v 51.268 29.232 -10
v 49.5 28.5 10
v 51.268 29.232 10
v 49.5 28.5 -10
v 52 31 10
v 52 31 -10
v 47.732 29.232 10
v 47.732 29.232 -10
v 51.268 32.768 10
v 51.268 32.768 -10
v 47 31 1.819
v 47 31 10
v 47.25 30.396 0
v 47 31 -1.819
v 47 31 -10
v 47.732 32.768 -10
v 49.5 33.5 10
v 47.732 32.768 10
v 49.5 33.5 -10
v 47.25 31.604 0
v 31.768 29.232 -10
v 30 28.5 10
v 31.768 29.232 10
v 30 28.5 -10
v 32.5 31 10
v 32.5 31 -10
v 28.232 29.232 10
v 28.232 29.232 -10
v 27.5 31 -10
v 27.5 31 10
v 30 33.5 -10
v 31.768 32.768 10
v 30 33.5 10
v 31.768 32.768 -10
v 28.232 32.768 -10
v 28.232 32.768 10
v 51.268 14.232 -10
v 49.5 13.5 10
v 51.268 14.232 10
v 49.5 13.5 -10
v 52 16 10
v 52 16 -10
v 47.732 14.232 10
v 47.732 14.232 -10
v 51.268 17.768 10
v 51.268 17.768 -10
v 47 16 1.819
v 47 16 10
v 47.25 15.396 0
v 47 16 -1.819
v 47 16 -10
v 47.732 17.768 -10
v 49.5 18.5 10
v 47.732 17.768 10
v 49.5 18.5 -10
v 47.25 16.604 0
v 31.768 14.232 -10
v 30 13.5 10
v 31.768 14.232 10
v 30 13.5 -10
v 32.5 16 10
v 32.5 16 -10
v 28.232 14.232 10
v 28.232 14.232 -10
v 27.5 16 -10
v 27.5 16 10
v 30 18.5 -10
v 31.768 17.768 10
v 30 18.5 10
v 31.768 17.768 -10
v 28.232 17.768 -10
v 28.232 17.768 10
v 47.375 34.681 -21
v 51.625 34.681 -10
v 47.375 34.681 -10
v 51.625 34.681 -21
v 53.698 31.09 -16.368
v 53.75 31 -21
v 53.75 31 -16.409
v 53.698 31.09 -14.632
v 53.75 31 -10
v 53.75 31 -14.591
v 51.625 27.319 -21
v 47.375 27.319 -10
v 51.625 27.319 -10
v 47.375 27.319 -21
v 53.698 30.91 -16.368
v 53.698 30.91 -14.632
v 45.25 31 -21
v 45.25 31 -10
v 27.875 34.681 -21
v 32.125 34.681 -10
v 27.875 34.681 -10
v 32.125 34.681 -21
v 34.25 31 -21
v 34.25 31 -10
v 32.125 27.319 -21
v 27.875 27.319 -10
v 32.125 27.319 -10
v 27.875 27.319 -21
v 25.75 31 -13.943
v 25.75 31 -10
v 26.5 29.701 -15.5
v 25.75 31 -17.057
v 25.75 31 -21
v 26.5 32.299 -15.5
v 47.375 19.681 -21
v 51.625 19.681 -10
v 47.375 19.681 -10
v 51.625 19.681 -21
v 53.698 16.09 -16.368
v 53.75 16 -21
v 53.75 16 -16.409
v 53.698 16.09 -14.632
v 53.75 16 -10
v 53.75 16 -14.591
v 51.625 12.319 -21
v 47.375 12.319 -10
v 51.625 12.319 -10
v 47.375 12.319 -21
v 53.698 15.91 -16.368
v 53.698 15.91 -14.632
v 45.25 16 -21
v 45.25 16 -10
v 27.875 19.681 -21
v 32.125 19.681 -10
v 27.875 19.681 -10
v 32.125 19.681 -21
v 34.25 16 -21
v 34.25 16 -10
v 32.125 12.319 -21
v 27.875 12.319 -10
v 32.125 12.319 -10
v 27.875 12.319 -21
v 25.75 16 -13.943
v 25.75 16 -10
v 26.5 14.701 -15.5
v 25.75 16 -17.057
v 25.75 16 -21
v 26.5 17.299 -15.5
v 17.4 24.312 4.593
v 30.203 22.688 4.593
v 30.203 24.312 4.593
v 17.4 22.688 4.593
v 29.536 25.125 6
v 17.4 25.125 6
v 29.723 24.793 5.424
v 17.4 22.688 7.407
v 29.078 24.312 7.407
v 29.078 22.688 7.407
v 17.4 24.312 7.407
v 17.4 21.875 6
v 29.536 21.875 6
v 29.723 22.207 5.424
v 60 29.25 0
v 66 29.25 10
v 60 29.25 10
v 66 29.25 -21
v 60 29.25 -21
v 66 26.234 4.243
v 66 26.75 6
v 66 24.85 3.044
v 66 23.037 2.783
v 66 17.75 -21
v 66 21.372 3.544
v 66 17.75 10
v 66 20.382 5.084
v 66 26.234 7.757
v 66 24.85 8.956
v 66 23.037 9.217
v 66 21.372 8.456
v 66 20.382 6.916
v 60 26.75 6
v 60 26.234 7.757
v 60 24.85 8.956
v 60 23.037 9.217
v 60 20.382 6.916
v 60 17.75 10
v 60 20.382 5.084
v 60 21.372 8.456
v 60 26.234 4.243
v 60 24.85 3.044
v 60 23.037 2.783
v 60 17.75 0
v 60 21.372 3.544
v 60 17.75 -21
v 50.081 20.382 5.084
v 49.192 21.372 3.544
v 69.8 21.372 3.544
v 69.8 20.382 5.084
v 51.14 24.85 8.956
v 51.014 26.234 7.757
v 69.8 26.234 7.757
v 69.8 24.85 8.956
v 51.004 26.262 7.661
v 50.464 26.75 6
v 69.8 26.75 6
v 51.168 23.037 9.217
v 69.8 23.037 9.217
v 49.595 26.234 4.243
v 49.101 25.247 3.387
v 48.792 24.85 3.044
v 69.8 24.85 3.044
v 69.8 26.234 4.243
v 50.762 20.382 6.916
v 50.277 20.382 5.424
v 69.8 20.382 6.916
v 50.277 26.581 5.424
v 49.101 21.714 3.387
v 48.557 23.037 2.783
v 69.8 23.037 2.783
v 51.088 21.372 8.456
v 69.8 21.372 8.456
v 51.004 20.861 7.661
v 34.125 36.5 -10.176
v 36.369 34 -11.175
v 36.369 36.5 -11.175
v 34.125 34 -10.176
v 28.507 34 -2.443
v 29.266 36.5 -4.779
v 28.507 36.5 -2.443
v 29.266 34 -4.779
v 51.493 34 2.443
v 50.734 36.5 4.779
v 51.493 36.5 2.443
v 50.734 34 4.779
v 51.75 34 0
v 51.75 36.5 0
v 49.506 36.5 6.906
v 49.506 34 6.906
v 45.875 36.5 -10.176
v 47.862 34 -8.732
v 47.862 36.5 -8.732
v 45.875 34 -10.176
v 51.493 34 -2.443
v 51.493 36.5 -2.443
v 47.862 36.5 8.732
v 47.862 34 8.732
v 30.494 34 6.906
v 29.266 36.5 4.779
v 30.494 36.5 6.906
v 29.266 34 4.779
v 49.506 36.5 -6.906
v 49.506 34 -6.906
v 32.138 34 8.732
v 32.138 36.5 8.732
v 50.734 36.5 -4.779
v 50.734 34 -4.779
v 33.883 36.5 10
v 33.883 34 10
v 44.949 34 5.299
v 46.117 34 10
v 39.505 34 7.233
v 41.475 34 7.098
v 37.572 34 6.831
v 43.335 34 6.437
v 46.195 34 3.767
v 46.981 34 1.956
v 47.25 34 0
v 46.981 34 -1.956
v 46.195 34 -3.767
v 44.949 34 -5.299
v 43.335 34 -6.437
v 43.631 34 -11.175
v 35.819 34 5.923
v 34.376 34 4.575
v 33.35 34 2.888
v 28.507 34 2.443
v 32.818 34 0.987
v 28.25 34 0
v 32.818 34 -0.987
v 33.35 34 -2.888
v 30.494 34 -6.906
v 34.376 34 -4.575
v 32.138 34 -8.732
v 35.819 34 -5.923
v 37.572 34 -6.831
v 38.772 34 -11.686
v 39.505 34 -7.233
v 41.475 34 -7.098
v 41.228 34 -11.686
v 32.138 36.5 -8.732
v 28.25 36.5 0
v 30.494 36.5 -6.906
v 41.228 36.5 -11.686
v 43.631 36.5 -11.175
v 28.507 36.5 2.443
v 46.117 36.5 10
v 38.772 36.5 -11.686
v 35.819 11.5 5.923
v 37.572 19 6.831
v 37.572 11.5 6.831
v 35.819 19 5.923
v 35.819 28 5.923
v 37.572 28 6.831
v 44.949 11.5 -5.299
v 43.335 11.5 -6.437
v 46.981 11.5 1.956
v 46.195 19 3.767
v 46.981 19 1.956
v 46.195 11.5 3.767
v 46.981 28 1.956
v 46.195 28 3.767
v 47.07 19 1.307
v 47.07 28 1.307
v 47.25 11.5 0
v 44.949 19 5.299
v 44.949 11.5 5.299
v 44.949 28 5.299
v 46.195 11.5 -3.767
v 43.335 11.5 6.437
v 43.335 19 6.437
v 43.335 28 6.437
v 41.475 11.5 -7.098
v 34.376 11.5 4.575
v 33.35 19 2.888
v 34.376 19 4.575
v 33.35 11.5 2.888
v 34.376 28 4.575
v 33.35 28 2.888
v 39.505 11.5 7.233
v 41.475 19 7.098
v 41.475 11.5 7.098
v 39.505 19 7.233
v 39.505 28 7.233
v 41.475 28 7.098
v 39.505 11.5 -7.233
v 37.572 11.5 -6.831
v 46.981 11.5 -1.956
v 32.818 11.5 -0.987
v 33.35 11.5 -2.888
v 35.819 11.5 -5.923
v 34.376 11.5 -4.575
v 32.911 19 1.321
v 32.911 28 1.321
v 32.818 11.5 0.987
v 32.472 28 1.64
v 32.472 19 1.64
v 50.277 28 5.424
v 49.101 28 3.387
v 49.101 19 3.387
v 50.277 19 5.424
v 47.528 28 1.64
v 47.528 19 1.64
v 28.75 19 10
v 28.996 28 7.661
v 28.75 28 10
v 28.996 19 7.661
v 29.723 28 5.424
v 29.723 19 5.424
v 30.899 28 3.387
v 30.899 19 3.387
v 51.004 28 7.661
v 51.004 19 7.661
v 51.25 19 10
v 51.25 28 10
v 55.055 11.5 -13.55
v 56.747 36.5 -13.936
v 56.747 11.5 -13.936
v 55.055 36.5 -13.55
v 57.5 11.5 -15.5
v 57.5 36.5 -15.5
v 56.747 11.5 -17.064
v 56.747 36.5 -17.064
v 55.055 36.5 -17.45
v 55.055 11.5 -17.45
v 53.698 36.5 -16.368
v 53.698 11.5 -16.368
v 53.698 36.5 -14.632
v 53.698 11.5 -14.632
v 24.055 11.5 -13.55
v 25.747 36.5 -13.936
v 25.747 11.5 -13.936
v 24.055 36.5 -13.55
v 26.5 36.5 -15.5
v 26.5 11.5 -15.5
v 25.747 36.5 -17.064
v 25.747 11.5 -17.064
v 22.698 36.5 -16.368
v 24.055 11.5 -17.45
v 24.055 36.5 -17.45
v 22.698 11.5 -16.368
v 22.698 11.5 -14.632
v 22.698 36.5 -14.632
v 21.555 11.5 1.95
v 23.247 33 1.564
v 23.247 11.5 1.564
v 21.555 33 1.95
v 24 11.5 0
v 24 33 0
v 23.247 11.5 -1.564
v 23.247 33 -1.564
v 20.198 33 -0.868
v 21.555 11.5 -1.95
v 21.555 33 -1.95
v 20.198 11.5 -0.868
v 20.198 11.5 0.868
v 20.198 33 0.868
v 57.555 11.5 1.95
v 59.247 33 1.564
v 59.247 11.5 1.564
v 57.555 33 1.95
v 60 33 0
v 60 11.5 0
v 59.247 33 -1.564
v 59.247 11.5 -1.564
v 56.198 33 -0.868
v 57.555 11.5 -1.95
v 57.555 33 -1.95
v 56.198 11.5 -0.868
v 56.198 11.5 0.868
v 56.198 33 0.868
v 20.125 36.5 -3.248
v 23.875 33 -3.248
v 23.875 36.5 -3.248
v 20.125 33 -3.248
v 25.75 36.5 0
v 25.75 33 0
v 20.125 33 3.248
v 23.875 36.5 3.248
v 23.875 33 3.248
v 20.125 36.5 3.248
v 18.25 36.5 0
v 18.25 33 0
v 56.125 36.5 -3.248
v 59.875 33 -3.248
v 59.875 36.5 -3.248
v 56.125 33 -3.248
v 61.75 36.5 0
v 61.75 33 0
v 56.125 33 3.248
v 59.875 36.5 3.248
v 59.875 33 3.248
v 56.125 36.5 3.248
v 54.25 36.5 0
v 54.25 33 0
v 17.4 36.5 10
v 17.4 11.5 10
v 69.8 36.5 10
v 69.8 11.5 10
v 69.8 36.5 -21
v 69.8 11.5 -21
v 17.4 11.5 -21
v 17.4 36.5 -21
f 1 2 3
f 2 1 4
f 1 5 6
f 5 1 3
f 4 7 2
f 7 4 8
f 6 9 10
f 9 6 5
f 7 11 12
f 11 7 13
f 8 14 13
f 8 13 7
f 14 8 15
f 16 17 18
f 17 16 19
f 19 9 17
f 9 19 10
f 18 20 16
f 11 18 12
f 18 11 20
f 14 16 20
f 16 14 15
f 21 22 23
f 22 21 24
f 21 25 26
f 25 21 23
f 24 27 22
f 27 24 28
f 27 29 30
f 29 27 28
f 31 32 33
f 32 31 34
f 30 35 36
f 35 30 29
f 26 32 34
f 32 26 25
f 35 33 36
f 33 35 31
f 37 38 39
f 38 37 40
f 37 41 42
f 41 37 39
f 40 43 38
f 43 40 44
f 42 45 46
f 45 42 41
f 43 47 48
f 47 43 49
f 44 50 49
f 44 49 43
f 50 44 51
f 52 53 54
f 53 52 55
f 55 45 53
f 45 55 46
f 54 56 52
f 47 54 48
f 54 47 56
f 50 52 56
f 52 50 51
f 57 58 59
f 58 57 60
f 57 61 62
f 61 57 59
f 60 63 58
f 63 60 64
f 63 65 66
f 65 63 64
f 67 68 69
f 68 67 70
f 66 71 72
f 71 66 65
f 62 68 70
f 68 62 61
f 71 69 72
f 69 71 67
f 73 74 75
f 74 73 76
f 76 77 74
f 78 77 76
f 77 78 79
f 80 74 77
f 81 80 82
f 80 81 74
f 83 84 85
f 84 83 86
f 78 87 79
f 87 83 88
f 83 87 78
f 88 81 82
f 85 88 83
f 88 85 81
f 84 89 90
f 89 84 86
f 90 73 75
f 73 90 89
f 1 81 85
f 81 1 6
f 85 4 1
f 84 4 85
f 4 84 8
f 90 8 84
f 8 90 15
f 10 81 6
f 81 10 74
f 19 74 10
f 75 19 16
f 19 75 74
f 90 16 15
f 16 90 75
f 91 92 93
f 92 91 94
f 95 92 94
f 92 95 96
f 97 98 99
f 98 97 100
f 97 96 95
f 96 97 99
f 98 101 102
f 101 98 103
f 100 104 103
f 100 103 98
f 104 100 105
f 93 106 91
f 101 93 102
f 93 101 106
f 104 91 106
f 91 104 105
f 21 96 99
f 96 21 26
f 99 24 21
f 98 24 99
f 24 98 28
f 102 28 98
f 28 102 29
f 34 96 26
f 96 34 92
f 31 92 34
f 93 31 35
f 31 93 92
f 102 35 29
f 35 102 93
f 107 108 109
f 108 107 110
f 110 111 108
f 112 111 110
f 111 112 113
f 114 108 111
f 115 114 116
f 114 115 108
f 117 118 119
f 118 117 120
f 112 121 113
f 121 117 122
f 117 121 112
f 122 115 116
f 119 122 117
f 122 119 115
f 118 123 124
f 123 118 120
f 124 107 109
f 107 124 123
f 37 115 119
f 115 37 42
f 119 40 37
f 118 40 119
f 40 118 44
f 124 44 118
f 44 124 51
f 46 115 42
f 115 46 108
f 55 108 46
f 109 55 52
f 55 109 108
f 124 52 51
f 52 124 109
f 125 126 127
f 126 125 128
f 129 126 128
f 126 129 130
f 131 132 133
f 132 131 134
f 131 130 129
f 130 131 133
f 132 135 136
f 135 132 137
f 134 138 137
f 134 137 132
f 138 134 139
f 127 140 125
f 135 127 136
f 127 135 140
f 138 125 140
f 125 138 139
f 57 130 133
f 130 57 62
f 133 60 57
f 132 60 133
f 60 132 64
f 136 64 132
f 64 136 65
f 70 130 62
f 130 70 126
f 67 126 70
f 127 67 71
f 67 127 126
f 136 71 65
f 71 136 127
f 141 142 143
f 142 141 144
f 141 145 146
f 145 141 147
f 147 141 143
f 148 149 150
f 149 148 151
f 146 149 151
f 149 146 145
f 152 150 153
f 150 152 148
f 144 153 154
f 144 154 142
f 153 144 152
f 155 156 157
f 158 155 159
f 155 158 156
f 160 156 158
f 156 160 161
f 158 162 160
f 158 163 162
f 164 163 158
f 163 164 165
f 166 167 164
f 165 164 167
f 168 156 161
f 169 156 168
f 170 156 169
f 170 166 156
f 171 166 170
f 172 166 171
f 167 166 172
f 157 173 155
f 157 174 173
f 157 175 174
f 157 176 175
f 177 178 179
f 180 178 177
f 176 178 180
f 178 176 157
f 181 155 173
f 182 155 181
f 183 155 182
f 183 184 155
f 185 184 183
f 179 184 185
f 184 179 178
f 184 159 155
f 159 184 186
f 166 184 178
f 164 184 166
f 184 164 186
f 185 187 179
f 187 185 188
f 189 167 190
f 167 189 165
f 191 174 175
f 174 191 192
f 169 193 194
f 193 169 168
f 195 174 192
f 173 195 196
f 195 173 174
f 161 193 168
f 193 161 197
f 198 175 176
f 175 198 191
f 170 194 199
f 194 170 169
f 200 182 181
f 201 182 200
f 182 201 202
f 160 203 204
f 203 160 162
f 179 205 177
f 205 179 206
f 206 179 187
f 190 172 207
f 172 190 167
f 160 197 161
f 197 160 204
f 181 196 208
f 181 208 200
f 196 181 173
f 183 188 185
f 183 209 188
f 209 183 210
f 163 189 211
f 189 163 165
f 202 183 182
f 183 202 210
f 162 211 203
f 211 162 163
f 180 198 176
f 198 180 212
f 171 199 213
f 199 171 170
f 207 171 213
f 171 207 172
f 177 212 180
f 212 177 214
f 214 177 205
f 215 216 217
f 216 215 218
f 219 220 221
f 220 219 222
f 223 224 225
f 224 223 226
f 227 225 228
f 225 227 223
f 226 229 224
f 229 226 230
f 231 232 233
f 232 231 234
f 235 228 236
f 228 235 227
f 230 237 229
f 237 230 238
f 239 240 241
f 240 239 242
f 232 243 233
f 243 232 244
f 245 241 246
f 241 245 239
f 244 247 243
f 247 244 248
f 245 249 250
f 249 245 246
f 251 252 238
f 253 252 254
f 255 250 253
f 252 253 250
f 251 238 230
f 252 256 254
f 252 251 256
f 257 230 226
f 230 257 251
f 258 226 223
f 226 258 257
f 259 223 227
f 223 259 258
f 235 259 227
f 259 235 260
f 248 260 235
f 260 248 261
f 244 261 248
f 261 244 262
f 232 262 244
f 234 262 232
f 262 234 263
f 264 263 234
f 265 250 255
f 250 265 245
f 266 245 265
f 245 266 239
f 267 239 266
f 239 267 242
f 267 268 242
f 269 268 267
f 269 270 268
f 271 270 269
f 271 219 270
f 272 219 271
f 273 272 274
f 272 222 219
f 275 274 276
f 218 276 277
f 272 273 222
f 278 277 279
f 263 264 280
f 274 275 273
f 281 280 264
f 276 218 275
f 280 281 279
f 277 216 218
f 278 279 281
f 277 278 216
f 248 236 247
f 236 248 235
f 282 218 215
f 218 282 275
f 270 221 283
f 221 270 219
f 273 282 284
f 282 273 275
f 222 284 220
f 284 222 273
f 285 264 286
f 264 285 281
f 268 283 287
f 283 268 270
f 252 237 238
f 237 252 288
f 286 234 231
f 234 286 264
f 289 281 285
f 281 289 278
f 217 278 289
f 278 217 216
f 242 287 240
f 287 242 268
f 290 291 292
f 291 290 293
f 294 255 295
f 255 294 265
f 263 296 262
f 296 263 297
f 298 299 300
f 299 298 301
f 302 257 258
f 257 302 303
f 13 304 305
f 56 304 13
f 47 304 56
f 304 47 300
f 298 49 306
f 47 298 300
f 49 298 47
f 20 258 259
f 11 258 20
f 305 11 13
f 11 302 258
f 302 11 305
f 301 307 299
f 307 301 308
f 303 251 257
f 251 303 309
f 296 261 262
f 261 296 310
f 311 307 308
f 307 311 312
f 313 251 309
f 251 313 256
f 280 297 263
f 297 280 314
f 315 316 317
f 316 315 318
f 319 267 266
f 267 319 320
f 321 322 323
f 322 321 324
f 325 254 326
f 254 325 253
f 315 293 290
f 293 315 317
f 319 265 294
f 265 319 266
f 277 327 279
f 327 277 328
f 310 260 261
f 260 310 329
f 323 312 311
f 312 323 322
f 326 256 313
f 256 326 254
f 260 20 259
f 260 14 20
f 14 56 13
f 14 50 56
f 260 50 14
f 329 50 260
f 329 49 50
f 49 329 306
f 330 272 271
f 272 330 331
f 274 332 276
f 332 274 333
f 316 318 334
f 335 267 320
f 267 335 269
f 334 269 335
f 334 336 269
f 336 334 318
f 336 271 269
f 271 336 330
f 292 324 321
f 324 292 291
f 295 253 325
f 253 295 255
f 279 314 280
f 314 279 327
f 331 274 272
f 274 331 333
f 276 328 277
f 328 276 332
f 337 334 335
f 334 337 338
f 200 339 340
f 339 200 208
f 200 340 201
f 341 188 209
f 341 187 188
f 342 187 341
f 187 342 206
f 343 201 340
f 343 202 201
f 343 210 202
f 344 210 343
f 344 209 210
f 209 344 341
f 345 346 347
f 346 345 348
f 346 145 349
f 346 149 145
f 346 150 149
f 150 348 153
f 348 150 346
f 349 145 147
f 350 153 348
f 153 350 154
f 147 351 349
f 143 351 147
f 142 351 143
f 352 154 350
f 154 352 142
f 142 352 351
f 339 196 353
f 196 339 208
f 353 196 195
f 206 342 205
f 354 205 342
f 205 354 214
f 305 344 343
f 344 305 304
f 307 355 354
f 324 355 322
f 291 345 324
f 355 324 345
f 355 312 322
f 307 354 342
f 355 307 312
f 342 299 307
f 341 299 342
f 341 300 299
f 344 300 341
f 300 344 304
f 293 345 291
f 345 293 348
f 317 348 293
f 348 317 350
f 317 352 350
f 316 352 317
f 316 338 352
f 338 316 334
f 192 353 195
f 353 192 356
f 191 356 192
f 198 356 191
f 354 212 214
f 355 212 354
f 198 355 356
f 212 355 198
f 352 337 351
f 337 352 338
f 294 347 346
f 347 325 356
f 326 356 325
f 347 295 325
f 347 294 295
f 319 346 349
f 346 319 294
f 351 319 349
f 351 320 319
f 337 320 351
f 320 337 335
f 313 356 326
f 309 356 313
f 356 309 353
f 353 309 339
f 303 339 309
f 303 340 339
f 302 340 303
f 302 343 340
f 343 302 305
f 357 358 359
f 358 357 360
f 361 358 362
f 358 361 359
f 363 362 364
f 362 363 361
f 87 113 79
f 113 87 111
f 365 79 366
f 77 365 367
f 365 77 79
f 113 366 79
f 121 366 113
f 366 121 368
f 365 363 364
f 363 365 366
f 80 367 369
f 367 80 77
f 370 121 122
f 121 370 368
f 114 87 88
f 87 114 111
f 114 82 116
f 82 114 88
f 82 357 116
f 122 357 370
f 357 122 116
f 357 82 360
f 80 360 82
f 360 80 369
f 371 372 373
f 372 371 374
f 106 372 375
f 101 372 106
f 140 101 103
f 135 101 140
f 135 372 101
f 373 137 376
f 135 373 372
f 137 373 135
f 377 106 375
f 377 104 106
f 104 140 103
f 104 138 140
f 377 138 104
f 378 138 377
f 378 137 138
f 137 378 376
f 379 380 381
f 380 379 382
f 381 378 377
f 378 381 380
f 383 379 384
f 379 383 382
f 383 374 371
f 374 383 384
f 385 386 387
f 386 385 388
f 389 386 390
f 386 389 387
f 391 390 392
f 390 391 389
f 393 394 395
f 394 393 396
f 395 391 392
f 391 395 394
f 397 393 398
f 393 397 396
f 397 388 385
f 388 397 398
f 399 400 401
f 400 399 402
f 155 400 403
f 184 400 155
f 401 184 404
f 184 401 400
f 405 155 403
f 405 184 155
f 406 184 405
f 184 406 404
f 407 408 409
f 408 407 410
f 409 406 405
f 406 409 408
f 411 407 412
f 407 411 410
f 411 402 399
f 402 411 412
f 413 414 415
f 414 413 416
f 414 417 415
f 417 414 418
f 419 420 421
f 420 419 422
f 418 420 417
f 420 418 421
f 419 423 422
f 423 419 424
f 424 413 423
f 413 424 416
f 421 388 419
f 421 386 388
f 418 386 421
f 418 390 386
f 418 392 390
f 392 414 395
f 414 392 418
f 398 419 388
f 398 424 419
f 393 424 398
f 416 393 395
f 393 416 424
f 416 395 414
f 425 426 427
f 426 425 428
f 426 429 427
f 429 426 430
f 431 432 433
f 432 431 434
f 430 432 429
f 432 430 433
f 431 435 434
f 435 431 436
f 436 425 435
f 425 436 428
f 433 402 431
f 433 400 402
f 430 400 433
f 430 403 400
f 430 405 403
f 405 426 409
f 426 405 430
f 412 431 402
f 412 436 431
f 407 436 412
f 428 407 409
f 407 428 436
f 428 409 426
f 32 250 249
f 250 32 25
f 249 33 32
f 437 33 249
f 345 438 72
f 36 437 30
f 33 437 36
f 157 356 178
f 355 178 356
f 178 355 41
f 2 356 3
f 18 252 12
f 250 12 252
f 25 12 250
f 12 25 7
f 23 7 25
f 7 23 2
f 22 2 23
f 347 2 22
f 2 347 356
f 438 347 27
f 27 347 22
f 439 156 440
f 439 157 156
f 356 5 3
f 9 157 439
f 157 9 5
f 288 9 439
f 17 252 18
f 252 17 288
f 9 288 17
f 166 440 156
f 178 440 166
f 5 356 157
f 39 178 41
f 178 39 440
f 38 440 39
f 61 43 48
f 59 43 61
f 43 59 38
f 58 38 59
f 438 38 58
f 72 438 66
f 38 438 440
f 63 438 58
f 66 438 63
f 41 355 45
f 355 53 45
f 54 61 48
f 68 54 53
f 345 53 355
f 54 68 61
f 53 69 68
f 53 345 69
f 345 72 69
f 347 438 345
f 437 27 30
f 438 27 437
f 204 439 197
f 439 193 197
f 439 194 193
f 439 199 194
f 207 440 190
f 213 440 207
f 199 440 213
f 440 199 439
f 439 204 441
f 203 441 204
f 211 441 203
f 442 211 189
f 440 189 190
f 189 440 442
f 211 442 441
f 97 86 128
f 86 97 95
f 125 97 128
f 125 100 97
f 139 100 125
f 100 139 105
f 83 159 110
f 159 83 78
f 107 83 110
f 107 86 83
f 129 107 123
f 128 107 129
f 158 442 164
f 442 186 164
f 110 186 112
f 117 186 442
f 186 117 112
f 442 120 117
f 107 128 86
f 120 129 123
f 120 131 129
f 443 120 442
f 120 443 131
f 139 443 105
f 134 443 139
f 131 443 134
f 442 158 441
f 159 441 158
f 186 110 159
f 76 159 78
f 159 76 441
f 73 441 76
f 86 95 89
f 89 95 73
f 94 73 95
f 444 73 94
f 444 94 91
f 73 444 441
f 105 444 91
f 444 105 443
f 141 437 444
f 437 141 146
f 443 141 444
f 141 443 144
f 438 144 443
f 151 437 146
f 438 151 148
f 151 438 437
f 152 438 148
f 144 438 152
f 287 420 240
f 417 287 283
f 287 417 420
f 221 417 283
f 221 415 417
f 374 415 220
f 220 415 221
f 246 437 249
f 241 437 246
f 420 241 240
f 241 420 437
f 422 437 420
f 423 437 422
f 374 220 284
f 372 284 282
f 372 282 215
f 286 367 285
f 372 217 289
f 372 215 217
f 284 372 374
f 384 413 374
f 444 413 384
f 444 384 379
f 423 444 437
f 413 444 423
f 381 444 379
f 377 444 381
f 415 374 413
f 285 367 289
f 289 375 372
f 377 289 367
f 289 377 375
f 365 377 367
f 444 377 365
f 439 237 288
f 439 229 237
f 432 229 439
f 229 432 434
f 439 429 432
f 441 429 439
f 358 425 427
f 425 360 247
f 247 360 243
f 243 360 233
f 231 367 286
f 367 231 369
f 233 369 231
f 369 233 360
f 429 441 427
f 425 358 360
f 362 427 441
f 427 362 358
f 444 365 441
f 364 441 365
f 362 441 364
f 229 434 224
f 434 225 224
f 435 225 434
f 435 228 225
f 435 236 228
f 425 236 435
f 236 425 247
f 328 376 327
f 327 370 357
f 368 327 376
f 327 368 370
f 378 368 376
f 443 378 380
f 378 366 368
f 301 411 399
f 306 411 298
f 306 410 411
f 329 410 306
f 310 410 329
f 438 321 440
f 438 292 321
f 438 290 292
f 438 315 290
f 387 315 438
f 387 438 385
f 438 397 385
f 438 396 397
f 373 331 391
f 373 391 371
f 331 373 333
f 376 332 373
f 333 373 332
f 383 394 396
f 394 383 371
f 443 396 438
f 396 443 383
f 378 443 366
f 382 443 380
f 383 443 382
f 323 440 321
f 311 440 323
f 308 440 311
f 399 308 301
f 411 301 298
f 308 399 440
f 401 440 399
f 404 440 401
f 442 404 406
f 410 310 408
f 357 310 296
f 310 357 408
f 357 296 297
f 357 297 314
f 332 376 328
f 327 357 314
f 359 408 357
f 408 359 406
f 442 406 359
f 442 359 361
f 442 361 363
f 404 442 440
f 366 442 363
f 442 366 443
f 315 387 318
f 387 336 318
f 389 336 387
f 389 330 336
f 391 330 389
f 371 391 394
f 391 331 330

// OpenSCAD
// file: Rook_Config.scad
// Rook 3D Printer Configuration
// Created By Jeffrey Olijar 
// Jolijar@gmail.com

// Layer Height
LH = 0.38;

// 608 skate bearing
Bearing_OD = 22.5; 
Bearing_ID = 8;
Bearing_H = 7;

// M3 Nut Diameter
N3 = 7.5;

// M4 Screw Hole Diameter
M4 = 4;

// M5 Screw Hole Diameter
M5 = 5.4;

// M8 Rod Diameter (configure for a tight fit)
M8 = 8.2;

// M8 Nut Diameter
N8 = 15.5;

//LM8UU Bearing
LBD = 15.4; // Diameter
LBH = 25; // Height
LBI = 8;  // Inner Diameter

//Makergear Groovemount
GVO = 16.5; // Outside Diameter
GVI = 12.5;  // Inside Groove Diameter

// Distance Between Centers for X rods
DBCX = 70;
// main file
// Rook 3D Printer 
// Extruder
// Created By Jeffrey Olijar 
// Jolijar@gmail.com
// Revision 1.00
// 1 x required 

include <Rook_Config.scad>

module Rook_Extruder(){


	difference(){
		union(){
translate(v=[40,-26.5,-15]){
//cube(size =[34,22,12], center = true);
}

translate(v=[43.6,24,-5.5]){
cube(size =[52.4,25,31], center = true);
}




	   	            }

		union(){
translate(v=[36.25,0,18]){
cube(size =[333,600,16], center = true);
}


translate(v=[35,11,0]){
rotate(a=[90,0,0]){
translate(v=[5,0,0]){
			
translate(v=[0,0,-25.5]){
			cylinder(h=5,r=11.75, center = true);
}
			cylinder(h=500,r=7.25, center = true);
translate(v=[0,10,-12.5]){
cylinder(h=9,r=Bearing_OD/2, center = true);
}
rotate(a=[90,0,0]){
translate(v=[9.5,-20,0]){
cylinder(h=500,r=M4/2+0.5, center = true);
}
translate(v=[-10,-20,0]){
cylinder(h=500,r=M4/2+0.5, center = true);
}
translate(v=[9.5,-5,0]){
cylinder(h=500,r=M4/2+0.5, center = true);
}
translate(v=[-10,-5,0]){
cylinder(h=500,r=M4/2+0.5, center = true);
}

translate(v=[9.5,-20,35]){
cylinder(h=50,r=7.5/2+0.5, $fn=6, center = true);
}
translate(v=[-10,-20,35]){
cylinder(h=50,r=7.5/2+0.5, $fn=6,  center = true);
}
translate(v=[9.5,-5,35]){
cylinder(h=50,r=7.5/2+0.5, $fn=6,  center = true);
}
translate(v=[-10,-5,35]){
cylinder(h=50,r=7.5/2+0.5, $fn=6,  center = true);
}


}










translate(v=[0,0,50]){
rotate(a=[90,0,0]){
translate(v=[9.5,-20,0]){
cylinder(h=500,r=M4/2+0.5, center = true);
}
translate(v=[-10,-20,0]){
cylinder(h=500,r=M4/2+0.5, center = true);
}
translate(v=[9.5,-5,0]){
cylinder(h=500,r=M4/2+0.5, center = true);
}
translate(v=[-10,-5,0]){
cylinder(h=500,r=M4/2+0.5, center = true);
}
}
}



translate(v=[0,-15,40]){
rotate(a=[0,0,90]){
cylinder(h=50,r=M8/2, center = true);

translate(v=[0,0,-2.5]){
cylinder(h=Bearing_H+1.75 ,r=Bearing_OD/2+1.5, center = true);
}

}
}









rotate(a=[0,90,0]){
translate(v=[0,1,7]){
translate(v=[12.5,5,0]){
cylinder(h=500,r=3.25/2, center = true);
translate(v=[0,-10,16]){
cube(size =[11.5,60,6], center = true);
}
translate(v=[0,20,25]){
//cube(size =[GVI,60,16], center = true);
}

translate(v=[0,0,16]){
//cylinder(h=6,r=GVO/2, center = true);
translate(v=[0,0,7]){
cylinder(h=50,r=6.5/2, center = true);
}
}
}
}
}
translate(v=[15.5,15.5,0]){
cylinder(h=500,r=M4/2, center = true);
}
translate(v=[15.5,-15.5,-10]){
cylinder(h=50,r=M4/2, center = true);
}
translate(v=[-15.5,15.5,-10]){
cylinder(h=50,r=M4/2, center = true);
}
translate(v=[-15.5,-15.5,-10]){
cylinder(h=50,r=M4/2, center = true);
}
translate(v=[-18,0,0]){
cylinder(h=500,r=M4/2, center = true);
}
translate(v=[18,0,0]){
cylinder(h=500,r=M4/2, center = true);
}



translate(v=[-18,0,-47]){
cylinder(h=50,r=N3/2, $fn=6,  center = true);
}
translate(v=[18,0,-47]){
cylinder(h=50,r=N3/2, $fn=6,  center = true);
}










}
translate(v=[-21.5,4,0]){
cylinder(h=500,r=M4/2, center = true);
}
translate(v=[-21.5,-15,0]){
cylinder(h=500,r=M4/2, center = true);
}
			}
}
		 	  translate(v=[0,-10,0]){
							cube(size = [M8,LBD,45], center = true);
						         }
			  cylinder(h=45,r=LBD/2, center = true);
			  }
		    	}
			}

Rook_Extruder();
